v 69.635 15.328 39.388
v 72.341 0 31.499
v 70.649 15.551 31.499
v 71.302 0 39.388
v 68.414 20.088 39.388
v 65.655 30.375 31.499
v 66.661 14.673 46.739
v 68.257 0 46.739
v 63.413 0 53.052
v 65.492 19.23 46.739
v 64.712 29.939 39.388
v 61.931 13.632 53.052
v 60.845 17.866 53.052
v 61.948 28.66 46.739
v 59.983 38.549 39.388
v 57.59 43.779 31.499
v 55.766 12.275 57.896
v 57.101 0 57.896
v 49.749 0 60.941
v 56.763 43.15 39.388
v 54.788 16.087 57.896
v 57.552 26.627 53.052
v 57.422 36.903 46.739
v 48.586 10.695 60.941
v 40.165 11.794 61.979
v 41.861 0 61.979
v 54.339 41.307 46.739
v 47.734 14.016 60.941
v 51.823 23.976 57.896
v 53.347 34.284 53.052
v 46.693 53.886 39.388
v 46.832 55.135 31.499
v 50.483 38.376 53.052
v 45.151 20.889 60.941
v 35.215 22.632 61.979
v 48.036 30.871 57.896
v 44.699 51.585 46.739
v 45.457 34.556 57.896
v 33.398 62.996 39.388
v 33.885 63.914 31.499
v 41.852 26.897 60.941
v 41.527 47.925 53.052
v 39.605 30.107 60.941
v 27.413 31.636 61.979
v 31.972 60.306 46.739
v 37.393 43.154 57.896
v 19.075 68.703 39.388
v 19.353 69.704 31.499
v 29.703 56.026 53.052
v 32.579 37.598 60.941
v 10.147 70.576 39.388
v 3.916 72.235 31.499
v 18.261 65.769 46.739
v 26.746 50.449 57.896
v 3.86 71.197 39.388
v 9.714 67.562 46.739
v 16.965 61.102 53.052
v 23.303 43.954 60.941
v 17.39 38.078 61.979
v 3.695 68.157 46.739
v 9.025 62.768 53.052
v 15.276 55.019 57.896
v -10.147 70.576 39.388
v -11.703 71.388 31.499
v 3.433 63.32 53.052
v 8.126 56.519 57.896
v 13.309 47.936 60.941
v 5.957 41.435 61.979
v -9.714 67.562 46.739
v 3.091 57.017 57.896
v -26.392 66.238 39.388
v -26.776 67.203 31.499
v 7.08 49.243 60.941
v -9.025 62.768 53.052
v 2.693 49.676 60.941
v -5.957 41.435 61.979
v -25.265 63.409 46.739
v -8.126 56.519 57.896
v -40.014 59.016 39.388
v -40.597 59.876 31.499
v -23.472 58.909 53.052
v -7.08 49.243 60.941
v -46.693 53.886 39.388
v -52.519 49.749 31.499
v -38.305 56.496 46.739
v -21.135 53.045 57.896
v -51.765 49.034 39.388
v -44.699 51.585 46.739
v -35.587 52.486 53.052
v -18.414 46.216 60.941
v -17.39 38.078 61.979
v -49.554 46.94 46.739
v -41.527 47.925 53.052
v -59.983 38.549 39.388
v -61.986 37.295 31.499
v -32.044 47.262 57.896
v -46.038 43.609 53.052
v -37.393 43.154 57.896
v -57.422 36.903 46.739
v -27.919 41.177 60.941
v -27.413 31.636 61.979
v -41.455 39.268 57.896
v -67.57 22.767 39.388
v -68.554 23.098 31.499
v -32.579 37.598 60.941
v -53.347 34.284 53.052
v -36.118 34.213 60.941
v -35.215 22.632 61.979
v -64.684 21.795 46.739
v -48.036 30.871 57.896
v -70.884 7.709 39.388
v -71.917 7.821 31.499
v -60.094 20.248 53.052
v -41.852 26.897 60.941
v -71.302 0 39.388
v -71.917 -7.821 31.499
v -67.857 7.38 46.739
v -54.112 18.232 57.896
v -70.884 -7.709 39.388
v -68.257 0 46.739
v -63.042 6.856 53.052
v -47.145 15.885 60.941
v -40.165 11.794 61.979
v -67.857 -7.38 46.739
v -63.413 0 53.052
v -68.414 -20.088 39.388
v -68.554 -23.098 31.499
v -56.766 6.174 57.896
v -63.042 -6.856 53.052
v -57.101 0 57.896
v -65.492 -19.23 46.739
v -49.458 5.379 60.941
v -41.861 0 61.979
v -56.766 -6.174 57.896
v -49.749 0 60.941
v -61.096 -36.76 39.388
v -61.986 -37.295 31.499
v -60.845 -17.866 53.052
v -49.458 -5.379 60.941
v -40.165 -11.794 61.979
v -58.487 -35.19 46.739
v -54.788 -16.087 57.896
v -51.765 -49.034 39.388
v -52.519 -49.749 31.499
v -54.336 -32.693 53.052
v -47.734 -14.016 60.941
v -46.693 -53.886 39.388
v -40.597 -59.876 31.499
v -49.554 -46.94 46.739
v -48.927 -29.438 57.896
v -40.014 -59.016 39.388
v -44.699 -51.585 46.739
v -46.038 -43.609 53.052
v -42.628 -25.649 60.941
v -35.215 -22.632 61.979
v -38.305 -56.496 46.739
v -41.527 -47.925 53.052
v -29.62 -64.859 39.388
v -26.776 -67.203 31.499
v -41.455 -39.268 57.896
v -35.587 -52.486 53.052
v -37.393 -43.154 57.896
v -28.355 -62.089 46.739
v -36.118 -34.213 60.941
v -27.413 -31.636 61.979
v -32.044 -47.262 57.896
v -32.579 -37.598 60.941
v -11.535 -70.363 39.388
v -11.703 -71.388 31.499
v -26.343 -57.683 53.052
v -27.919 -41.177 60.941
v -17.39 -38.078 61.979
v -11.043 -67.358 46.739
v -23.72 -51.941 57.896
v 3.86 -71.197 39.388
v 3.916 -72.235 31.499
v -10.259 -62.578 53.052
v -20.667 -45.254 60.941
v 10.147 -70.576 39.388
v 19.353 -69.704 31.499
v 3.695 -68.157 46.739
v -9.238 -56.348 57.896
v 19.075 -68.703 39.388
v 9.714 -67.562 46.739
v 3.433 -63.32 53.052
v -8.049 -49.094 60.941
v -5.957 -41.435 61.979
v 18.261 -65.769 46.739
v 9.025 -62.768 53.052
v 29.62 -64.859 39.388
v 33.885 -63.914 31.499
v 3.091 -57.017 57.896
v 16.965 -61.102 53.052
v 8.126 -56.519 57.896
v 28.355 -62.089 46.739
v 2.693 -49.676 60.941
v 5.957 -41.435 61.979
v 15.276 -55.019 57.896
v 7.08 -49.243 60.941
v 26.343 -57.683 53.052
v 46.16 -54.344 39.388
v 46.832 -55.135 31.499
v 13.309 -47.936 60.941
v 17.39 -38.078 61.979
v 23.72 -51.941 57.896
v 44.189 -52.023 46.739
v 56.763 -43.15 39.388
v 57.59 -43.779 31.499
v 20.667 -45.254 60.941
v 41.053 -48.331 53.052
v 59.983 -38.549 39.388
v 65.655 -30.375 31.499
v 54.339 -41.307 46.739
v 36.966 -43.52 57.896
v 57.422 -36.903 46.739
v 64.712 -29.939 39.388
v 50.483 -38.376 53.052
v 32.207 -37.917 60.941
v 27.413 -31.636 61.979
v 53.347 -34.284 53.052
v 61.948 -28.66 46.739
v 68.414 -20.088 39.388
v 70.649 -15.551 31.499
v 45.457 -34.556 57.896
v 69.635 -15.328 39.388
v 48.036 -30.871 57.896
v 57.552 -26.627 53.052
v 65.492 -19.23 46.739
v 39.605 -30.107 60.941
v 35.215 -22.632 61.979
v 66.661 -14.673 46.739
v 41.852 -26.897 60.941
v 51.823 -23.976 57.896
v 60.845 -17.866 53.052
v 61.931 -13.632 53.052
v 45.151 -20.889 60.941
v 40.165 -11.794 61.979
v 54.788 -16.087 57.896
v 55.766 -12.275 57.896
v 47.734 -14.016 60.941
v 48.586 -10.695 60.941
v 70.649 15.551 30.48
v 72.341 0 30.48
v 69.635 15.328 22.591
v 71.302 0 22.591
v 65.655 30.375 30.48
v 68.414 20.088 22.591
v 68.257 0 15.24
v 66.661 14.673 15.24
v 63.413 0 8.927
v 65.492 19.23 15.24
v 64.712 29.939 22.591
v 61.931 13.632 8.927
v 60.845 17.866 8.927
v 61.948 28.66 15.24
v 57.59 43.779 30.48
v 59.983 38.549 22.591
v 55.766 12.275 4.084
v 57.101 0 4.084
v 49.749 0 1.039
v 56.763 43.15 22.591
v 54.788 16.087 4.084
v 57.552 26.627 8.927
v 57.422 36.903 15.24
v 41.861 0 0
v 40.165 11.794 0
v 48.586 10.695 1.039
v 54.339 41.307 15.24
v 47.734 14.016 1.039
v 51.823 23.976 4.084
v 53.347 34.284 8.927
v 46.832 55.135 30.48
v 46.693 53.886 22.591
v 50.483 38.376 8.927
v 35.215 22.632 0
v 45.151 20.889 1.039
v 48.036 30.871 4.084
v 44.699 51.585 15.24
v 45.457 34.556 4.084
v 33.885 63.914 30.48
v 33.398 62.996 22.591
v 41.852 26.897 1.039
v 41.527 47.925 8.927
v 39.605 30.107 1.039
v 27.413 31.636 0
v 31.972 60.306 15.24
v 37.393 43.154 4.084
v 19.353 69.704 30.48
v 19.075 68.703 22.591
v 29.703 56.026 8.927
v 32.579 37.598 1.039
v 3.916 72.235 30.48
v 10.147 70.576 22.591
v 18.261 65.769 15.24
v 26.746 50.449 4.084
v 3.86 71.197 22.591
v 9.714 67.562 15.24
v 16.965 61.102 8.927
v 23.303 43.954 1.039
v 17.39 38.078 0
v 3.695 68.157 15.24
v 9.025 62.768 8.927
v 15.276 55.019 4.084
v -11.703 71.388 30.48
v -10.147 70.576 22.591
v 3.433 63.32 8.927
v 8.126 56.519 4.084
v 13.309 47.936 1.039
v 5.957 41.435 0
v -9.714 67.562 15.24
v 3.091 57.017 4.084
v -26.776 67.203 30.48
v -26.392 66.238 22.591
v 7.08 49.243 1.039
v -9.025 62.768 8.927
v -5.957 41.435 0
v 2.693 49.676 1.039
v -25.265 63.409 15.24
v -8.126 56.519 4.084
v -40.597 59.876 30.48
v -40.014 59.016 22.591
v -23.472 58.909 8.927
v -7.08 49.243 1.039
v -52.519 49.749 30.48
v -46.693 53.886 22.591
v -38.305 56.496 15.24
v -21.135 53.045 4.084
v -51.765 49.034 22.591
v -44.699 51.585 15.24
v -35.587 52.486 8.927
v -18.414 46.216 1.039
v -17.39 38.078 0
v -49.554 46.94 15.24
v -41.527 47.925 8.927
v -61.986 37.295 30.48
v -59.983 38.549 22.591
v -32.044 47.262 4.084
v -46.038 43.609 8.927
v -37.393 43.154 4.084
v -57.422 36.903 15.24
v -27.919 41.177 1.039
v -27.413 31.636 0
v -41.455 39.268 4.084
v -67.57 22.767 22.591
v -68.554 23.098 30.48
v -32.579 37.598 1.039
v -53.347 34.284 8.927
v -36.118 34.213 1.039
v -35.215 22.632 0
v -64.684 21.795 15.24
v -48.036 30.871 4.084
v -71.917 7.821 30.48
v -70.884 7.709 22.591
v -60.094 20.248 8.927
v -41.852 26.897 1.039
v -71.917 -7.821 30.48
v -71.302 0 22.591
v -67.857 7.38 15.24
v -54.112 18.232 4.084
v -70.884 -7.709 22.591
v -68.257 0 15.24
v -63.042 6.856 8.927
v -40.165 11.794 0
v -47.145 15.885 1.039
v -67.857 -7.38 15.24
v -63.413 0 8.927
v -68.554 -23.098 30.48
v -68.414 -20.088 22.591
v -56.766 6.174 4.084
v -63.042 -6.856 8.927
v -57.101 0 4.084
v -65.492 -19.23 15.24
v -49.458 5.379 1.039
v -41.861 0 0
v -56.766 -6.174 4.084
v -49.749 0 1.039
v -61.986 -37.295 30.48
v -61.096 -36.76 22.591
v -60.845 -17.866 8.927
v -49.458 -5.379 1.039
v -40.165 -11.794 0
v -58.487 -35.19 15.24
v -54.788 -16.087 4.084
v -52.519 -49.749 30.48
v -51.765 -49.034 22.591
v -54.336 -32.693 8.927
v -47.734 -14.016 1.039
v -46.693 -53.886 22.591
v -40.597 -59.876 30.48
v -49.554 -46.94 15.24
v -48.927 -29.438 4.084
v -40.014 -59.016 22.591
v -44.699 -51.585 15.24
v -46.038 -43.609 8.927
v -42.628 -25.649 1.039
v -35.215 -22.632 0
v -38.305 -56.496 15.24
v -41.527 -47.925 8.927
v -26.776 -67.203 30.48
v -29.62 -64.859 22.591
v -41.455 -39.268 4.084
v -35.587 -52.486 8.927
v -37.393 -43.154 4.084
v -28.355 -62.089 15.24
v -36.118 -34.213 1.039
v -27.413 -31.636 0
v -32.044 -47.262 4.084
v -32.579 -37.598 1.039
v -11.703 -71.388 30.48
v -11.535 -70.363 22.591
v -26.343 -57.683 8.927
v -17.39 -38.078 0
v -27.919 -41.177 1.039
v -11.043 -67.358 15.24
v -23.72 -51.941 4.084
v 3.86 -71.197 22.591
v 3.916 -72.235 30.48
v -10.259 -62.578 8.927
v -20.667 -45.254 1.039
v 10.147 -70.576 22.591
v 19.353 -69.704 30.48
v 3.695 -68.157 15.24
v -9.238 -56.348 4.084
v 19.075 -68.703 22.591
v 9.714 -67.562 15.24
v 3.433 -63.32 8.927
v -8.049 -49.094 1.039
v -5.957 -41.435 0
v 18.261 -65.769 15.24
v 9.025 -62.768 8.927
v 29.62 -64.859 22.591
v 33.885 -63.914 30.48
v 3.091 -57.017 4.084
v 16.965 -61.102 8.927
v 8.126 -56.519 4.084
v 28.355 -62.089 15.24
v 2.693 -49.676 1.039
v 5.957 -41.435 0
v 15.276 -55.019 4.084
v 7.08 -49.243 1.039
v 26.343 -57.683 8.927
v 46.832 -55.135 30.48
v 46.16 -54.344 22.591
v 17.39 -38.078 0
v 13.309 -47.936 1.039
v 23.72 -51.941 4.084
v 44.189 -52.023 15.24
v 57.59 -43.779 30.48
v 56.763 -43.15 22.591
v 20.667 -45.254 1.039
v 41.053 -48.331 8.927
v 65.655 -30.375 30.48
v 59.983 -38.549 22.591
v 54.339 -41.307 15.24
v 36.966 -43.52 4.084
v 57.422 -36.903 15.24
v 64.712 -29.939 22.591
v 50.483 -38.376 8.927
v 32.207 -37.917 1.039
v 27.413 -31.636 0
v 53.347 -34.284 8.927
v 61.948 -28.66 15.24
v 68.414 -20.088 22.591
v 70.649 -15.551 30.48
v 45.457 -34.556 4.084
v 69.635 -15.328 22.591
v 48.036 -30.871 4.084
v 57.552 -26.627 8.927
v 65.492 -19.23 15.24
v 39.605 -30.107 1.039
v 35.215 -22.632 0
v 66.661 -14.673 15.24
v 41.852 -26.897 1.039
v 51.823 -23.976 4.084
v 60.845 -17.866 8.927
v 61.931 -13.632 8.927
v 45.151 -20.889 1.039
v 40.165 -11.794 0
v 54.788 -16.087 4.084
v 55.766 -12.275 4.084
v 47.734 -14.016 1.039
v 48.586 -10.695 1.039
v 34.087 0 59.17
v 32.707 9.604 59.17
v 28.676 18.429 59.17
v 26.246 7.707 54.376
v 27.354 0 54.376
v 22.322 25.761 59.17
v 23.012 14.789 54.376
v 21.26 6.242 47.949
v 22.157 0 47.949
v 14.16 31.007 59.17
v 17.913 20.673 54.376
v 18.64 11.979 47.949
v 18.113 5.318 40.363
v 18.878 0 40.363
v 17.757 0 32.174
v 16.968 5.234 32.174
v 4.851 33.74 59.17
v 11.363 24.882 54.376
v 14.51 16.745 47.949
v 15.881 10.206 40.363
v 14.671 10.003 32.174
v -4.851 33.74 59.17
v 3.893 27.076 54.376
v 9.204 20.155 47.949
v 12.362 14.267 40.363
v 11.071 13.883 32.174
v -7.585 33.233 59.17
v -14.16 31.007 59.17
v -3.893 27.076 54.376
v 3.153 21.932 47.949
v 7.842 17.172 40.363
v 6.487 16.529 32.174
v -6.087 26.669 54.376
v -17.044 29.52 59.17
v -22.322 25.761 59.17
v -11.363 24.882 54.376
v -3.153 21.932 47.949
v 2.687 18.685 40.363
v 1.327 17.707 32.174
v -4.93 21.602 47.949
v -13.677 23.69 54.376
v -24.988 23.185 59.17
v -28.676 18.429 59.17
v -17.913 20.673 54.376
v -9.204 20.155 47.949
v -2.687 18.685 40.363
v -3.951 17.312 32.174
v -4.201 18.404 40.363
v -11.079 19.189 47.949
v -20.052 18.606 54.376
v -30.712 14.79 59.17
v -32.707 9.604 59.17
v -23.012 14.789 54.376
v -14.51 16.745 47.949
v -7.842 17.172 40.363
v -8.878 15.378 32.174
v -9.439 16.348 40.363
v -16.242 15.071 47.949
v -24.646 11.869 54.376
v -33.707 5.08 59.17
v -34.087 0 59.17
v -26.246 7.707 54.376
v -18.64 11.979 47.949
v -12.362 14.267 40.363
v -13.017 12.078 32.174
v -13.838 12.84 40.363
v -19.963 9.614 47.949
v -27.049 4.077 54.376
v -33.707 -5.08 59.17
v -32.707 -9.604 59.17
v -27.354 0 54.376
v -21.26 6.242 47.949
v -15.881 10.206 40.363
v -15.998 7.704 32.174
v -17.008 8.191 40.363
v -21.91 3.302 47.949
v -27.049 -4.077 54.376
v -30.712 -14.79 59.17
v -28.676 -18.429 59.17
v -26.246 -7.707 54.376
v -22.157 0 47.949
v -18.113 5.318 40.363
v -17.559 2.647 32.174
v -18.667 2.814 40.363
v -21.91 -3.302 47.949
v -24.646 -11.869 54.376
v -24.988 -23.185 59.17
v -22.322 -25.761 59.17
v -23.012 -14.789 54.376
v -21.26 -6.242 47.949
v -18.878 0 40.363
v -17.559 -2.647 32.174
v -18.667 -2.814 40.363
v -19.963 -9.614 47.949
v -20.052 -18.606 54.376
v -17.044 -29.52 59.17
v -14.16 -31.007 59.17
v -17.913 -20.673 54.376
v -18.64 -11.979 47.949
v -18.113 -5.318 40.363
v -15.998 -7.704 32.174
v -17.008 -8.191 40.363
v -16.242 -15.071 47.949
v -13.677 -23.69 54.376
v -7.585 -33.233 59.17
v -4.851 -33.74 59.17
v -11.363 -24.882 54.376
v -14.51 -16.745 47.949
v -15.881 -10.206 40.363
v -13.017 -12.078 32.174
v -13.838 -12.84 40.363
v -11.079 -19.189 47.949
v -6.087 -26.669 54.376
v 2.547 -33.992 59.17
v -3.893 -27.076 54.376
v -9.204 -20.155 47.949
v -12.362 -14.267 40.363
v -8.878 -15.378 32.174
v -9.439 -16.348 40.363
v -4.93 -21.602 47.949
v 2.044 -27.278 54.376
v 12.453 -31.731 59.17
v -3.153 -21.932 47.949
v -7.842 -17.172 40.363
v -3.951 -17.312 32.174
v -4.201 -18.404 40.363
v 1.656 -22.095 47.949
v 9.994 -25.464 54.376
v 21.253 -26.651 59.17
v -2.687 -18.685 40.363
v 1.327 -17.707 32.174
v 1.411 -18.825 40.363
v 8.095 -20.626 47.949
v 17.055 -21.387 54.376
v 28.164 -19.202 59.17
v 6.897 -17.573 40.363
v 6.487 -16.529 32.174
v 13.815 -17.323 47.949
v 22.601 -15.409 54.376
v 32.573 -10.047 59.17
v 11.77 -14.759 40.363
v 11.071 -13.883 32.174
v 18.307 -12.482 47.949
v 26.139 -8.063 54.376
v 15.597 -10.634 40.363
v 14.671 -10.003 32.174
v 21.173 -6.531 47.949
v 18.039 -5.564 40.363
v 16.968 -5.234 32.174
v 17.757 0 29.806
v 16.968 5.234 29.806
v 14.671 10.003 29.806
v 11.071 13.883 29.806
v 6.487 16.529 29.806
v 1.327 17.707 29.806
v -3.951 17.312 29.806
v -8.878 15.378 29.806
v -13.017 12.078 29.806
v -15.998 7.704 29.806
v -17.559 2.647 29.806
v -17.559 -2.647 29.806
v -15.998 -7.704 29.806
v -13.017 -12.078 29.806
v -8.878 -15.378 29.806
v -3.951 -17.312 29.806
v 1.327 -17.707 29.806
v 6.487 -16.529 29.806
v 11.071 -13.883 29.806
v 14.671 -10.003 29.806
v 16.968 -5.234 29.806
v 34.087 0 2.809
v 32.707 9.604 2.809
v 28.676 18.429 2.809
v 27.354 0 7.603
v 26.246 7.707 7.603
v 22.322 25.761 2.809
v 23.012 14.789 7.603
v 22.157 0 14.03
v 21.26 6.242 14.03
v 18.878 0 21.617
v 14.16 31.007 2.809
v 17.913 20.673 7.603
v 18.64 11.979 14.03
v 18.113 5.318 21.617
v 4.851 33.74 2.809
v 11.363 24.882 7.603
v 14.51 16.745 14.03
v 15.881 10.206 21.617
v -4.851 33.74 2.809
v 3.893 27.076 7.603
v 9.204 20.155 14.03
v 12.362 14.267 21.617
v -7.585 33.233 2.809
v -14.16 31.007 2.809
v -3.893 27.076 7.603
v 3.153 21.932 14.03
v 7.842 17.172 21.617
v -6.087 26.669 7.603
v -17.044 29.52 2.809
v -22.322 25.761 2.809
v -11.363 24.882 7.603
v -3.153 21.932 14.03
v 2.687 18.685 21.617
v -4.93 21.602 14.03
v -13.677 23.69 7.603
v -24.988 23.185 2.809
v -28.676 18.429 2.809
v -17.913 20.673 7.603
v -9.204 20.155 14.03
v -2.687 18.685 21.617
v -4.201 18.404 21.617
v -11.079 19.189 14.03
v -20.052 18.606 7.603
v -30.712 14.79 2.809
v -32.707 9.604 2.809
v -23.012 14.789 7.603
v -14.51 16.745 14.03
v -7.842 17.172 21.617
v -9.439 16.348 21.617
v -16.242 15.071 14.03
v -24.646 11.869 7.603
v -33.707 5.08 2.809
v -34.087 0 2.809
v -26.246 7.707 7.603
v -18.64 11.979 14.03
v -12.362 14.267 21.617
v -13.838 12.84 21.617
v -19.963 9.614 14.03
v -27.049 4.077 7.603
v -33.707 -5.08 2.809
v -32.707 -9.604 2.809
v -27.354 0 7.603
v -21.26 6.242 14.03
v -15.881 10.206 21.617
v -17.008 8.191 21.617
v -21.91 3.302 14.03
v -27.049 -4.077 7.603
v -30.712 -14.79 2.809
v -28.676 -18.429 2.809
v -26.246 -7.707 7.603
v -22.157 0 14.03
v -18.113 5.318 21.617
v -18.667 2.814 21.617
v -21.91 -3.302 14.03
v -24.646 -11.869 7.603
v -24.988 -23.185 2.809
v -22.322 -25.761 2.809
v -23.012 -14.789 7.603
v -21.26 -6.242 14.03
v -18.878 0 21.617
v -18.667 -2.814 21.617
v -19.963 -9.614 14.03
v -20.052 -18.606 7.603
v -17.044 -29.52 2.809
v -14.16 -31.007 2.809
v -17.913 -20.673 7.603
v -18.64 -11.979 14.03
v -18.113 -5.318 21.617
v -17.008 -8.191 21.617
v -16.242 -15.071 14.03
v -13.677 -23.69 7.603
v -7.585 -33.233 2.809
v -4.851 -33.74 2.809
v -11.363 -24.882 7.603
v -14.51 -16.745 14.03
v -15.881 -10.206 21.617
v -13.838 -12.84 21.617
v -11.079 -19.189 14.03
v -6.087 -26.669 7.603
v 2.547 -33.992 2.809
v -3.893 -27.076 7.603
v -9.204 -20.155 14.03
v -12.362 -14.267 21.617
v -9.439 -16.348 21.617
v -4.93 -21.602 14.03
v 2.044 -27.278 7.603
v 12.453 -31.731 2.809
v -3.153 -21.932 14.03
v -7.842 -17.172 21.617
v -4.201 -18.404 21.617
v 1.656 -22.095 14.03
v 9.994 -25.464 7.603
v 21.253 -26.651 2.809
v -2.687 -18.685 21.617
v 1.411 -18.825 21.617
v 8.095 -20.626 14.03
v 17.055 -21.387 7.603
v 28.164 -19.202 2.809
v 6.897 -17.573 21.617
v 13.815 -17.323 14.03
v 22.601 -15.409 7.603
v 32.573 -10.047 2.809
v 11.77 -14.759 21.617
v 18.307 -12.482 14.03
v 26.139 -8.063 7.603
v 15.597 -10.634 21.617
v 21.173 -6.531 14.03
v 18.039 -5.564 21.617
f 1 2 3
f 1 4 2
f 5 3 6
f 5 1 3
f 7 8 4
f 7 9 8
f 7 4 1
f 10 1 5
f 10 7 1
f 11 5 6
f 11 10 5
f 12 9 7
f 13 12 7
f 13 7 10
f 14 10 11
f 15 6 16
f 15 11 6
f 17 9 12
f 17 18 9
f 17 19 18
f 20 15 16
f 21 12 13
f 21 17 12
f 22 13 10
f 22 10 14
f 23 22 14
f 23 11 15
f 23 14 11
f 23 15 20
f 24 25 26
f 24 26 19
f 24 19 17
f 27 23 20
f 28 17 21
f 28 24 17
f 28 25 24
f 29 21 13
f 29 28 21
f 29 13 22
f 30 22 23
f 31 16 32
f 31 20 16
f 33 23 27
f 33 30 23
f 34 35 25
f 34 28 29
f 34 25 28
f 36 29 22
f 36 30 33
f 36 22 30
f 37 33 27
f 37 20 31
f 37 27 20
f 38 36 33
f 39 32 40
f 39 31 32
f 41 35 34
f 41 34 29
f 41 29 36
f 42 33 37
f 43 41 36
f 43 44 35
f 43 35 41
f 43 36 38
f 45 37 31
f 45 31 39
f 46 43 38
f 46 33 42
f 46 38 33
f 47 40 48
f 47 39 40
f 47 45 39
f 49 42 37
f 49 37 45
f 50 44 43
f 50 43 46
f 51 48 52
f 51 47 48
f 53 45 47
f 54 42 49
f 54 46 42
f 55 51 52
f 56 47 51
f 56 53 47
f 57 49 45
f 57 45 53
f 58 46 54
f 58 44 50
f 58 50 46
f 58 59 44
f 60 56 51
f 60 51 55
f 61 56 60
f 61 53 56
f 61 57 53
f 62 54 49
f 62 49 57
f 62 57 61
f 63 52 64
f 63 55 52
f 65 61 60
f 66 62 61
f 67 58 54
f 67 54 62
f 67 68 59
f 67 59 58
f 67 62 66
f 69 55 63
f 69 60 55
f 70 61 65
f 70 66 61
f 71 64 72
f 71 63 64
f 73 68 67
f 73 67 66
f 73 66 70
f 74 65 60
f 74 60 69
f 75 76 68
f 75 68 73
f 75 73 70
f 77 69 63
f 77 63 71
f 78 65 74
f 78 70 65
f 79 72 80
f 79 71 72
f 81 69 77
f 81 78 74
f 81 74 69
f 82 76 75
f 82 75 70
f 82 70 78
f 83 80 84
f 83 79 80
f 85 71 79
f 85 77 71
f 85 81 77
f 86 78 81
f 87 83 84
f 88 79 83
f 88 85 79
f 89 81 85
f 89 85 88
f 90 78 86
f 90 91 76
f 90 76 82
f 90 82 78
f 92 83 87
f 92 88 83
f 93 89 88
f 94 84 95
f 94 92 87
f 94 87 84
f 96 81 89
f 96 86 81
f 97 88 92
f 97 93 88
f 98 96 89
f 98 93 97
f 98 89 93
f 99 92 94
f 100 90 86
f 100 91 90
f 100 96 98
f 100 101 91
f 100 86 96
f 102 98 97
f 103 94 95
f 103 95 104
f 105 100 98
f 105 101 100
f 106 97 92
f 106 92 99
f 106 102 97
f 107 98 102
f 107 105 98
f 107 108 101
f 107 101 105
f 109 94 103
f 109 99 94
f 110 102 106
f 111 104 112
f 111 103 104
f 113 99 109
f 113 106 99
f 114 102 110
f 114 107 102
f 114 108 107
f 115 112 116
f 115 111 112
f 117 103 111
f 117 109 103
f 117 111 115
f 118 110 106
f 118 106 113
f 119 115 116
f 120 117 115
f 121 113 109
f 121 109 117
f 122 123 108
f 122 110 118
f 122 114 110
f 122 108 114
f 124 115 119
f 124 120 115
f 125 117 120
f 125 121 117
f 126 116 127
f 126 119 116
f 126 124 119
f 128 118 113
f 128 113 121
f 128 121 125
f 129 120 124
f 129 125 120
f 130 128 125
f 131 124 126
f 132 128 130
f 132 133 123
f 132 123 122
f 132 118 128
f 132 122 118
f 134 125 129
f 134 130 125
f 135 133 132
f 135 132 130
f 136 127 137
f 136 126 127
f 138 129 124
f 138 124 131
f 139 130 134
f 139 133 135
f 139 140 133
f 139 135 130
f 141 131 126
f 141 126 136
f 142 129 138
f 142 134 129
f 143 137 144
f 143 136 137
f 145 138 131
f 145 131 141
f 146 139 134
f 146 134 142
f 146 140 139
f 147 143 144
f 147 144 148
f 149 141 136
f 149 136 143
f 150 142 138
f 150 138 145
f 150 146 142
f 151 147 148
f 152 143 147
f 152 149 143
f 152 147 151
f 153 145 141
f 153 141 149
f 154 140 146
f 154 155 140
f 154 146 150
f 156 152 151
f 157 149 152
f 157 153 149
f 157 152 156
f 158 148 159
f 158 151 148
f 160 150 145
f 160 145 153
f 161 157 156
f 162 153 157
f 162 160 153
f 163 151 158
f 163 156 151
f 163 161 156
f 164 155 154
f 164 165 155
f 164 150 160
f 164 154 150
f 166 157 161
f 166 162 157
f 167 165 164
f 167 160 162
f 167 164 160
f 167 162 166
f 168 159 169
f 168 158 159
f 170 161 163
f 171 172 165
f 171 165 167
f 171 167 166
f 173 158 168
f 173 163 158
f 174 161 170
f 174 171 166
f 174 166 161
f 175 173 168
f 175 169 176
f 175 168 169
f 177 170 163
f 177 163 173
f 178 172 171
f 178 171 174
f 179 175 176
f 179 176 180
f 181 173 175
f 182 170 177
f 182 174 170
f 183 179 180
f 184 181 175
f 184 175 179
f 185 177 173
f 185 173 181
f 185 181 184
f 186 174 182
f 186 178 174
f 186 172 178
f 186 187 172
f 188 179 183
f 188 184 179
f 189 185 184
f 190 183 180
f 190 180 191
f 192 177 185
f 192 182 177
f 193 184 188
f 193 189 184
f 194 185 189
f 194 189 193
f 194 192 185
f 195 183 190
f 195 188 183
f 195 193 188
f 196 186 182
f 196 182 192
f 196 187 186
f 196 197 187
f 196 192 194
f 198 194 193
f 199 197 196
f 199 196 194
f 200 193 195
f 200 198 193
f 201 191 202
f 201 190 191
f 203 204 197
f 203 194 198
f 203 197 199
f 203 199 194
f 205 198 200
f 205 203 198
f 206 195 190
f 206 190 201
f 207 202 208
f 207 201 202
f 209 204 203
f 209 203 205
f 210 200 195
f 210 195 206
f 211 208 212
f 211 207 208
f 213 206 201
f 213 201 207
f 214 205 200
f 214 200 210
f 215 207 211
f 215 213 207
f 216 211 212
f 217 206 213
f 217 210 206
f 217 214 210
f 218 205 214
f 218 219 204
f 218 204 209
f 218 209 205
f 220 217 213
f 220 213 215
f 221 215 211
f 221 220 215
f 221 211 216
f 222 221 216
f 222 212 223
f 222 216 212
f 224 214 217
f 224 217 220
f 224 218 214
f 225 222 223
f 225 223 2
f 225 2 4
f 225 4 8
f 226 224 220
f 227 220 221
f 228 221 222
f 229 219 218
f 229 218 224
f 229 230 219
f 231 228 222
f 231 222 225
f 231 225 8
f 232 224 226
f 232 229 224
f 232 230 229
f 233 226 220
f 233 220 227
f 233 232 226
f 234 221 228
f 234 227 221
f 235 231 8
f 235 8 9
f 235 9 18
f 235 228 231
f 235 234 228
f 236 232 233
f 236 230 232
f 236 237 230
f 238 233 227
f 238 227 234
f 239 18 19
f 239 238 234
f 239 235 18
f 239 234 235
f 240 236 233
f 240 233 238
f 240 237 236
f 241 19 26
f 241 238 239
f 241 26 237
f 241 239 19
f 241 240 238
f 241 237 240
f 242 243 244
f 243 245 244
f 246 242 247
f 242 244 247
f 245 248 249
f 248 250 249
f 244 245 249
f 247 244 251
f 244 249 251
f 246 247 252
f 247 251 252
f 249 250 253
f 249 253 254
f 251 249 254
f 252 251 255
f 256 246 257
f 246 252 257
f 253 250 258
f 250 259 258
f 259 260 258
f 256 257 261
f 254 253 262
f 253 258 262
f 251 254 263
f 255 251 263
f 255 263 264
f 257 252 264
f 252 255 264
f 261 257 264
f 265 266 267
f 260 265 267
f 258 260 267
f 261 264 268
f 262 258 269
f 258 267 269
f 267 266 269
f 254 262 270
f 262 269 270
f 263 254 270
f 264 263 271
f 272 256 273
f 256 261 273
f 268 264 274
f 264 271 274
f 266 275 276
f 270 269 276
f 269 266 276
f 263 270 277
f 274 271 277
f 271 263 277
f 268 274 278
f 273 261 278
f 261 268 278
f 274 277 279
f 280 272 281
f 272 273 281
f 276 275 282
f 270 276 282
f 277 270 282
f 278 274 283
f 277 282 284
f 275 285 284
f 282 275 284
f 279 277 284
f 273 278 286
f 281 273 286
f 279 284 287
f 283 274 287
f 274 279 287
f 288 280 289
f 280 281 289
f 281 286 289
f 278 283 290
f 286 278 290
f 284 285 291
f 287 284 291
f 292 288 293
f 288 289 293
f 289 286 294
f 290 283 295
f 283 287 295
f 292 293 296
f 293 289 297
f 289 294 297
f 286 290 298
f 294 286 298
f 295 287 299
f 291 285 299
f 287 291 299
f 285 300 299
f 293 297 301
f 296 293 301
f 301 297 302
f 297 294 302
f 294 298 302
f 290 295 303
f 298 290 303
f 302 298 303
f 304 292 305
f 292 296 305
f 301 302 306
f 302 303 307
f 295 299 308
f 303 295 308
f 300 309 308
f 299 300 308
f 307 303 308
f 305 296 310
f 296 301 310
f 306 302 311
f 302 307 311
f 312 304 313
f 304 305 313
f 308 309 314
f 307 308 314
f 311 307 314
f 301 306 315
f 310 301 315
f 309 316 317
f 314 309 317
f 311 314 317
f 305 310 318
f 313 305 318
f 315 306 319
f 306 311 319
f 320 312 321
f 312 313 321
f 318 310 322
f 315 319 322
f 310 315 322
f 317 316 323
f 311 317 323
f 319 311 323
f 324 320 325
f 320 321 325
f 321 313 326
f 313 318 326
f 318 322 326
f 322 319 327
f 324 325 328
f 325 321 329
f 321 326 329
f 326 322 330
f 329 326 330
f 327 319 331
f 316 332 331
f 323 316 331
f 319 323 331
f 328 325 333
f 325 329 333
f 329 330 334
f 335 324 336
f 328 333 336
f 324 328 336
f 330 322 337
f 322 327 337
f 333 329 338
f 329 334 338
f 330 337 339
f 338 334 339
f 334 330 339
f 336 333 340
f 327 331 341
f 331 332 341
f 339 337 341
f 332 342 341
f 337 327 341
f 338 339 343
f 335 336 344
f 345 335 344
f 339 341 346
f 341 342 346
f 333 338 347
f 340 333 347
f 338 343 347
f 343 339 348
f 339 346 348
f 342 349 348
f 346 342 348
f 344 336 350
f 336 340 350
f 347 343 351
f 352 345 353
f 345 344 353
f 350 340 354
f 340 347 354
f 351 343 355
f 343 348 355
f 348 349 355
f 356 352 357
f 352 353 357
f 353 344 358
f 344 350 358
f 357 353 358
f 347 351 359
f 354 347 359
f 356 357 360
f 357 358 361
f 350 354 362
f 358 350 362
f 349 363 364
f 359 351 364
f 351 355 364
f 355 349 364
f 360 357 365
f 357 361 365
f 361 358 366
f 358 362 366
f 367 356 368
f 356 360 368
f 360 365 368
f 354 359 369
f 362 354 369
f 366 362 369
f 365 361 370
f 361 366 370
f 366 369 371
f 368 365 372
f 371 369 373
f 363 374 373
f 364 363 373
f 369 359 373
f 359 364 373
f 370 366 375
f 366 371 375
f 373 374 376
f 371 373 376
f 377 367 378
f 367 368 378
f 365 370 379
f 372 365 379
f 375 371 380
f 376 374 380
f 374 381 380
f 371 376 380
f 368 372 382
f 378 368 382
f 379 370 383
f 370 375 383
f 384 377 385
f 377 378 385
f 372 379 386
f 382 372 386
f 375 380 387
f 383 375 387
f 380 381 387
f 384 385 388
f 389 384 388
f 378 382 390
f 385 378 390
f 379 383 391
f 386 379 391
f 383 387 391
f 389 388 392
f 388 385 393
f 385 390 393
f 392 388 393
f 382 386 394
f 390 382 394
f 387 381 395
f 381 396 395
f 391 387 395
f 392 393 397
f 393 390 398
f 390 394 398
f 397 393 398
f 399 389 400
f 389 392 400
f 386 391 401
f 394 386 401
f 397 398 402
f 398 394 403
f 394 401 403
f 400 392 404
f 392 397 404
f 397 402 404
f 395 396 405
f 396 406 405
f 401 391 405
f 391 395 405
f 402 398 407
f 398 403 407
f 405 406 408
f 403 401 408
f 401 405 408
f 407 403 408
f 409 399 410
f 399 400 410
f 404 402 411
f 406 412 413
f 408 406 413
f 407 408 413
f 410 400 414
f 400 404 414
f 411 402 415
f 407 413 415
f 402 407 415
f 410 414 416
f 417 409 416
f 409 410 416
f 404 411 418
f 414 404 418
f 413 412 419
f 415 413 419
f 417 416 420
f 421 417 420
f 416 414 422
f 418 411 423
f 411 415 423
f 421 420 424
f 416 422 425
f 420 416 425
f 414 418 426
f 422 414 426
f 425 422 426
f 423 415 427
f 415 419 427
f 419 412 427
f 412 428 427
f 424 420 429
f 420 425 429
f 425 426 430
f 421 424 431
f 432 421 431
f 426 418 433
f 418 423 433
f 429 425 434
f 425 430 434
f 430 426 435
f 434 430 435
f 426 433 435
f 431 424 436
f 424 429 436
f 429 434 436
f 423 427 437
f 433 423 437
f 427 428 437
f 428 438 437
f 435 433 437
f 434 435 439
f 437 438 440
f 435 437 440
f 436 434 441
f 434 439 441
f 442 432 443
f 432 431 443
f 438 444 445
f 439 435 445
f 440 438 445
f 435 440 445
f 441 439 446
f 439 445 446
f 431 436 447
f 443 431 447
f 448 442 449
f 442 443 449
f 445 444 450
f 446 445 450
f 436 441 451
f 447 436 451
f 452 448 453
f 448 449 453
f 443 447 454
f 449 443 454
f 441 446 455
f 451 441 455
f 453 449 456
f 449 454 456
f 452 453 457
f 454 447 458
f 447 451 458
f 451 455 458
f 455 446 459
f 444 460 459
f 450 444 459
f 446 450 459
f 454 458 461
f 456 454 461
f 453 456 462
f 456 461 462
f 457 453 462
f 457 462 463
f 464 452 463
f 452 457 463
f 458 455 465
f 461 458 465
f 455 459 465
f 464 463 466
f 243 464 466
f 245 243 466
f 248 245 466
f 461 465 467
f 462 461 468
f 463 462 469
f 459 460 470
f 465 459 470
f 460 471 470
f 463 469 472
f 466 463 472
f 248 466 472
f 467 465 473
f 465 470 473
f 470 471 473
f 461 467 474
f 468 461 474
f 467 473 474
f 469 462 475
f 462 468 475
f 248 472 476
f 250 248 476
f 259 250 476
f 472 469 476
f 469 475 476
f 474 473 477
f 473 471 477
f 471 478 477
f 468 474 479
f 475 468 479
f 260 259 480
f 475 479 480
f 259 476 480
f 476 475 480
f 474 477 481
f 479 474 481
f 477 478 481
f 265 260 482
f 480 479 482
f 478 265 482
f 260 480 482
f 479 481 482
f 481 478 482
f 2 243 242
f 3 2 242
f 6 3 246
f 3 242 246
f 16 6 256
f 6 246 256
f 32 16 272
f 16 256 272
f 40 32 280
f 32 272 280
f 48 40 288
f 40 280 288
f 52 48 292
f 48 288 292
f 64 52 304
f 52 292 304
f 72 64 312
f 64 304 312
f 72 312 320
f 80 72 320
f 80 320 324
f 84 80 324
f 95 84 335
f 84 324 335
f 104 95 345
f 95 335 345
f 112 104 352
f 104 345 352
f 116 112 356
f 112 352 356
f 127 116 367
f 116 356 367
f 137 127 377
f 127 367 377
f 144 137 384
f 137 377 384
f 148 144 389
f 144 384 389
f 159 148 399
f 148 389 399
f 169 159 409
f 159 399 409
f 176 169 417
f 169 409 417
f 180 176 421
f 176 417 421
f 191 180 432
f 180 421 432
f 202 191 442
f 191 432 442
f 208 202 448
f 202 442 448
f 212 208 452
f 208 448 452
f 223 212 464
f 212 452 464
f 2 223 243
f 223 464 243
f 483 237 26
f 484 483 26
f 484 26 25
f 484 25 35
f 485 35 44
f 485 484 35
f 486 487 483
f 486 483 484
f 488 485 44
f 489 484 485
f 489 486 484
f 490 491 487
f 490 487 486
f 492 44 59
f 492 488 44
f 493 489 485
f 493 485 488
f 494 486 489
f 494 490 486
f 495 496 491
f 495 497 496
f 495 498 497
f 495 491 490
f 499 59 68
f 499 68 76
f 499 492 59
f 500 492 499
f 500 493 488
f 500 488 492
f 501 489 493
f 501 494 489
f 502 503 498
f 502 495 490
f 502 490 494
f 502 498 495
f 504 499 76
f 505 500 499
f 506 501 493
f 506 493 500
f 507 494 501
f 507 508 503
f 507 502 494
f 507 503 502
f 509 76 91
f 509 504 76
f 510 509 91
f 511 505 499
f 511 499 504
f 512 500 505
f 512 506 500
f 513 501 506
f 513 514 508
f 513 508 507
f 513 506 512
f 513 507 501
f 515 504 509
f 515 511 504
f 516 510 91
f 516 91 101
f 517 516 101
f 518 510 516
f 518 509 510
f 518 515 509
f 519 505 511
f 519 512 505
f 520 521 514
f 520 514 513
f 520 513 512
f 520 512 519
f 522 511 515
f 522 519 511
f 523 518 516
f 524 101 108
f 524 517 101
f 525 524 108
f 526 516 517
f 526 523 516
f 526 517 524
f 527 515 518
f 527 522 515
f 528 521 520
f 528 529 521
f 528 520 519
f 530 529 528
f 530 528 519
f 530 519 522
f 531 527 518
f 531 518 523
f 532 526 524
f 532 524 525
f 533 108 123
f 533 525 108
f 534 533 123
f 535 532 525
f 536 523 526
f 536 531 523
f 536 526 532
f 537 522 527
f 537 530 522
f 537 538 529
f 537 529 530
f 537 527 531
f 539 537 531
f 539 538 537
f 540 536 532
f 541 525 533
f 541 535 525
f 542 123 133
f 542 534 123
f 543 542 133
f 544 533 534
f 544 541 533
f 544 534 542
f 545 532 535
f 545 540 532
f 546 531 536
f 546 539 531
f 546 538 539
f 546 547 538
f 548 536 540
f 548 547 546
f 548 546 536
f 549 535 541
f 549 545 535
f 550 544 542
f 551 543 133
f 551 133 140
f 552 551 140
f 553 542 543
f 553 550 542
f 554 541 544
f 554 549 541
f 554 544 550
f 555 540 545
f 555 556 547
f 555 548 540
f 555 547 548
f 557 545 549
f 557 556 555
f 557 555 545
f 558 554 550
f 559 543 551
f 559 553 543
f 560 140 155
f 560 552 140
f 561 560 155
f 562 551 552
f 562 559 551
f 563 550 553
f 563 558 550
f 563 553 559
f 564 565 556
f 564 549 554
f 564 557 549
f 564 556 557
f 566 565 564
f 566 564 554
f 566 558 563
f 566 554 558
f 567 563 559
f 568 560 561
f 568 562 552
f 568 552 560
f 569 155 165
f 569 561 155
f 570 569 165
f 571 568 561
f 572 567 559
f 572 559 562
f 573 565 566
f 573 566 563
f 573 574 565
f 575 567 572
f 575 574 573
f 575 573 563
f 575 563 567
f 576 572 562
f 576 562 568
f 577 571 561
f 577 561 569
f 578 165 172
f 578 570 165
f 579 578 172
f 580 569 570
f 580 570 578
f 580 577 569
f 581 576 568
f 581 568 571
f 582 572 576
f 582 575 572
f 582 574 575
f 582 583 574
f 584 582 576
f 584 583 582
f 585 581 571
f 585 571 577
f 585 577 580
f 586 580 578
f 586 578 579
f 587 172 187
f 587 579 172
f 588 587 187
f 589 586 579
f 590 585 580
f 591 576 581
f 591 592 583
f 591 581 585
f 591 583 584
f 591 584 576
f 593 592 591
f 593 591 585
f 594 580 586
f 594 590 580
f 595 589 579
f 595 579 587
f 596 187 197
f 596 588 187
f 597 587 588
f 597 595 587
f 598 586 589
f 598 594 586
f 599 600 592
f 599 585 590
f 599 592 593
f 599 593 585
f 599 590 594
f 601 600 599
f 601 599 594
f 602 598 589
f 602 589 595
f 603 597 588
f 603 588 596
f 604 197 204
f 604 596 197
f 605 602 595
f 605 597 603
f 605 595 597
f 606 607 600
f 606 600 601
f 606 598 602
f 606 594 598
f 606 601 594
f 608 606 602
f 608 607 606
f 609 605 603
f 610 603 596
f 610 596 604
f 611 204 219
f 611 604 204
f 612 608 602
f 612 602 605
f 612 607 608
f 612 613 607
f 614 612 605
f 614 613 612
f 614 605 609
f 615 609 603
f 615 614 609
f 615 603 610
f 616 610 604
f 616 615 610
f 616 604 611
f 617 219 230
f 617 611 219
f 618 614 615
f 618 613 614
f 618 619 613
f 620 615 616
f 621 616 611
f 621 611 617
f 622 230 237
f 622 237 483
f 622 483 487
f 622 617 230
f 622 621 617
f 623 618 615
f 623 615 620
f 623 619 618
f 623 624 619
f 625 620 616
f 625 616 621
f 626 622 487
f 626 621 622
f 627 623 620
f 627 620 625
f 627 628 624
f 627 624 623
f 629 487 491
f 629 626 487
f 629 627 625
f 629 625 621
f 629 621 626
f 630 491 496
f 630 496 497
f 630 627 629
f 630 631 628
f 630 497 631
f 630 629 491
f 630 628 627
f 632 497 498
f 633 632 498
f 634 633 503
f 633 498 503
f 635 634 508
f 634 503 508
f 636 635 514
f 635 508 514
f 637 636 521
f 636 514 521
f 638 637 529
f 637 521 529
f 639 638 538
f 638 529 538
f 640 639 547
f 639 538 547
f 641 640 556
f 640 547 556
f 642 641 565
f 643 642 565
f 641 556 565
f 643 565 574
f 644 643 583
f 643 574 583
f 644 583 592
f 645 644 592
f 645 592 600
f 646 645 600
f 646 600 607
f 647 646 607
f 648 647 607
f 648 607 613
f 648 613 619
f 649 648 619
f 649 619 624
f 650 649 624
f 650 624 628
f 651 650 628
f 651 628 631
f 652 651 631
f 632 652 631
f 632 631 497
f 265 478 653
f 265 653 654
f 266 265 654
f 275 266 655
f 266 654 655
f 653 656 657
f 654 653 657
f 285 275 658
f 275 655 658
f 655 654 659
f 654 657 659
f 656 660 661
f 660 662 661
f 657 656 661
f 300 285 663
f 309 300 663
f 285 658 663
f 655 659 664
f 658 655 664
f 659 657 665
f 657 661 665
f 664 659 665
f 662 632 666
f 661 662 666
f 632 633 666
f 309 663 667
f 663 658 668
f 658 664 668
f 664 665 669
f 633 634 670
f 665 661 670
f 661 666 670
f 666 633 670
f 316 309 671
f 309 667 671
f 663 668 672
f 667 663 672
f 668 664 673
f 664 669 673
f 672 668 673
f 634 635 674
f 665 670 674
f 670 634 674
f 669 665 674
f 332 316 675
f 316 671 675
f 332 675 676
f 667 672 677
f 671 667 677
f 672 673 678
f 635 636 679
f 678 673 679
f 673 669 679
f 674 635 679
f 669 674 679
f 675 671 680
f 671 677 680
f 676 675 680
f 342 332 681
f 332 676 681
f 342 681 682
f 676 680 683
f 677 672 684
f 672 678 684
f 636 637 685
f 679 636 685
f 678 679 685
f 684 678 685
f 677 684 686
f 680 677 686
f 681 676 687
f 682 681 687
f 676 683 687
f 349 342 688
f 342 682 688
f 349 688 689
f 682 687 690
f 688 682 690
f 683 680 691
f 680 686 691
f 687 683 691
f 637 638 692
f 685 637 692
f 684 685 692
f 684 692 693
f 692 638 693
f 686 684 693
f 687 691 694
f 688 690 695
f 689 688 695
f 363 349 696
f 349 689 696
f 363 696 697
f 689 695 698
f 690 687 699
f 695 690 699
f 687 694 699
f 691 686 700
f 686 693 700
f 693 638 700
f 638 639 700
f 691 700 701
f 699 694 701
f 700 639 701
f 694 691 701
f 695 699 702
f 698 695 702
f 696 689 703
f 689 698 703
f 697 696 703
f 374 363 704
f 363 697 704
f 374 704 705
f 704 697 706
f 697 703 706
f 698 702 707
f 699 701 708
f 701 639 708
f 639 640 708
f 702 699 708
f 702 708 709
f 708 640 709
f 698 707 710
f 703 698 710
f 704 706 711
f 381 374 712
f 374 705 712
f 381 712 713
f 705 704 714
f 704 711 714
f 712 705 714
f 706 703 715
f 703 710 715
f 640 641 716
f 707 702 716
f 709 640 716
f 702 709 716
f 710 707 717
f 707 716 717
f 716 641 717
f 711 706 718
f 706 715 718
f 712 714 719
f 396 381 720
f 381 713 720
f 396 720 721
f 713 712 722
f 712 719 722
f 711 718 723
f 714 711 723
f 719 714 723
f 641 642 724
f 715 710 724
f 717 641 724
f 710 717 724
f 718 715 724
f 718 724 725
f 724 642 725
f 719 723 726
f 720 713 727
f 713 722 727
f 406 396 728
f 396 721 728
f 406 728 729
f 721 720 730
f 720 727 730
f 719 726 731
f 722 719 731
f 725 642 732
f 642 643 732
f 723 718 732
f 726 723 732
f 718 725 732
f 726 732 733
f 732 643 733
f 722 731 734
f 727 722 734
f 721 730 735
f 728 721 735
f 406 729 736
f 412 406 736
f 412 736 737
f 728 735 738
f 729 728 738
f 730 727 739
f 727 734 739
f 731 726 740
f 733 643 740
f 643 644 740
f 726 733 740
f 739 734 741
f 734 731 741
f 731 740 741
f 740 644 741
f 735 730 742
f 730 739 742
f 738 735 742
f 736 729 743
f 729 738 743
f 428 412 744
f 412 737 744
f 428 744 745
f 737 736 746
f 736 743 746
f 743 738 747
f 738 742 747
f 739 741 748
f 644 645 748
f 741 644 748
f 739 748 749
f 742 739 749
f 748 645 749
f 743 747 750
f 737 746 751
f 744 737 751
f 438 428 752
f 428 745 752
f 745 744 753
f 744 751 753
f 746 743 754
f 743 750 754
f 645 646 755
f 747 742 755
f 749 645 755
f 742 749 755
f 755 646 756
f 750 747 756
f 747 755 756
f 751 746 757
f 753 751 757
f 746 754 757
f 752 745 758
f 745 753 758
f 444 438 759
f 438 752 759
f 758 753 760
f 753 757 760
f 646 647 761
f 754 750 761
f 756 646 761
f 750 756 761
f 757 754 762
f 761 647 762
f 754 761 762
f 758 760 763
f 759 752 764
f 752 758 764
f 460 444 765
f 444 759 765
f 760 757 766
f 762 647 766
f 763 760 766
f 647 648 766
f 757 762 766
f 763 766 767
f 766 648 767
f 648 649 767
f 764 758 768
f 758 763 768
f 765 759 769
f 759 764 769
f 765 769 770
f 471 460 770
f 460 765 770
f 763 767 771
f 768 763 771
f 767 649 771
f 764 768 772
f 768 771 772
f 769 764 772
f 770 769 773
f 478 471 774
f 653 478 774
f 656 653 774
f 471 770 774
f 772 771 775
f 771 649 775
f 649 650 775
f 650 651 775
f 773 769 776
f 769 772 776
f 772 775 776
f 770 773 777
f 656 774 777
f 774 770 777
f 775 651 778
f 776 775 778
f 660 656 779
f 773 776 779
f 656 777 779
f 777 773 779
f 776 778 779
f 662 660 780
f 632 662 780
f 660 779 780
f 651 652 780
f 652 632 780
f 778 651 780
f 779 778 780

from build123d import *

# Parameters (mm, degrees)
F0_R     = 72.3406344385
F1_DEPTH = 61.9792044163
F2_R     = 17.7569535603
F3_DEPTH = 66.9353306293
F4_R     = 30.48


# Not quite as in the source:
# - a fillet or chamfer that OpenCascade refuses, or shapes differently, is made with other operations: its cross-section is extruded or revolved along the edge and cut away or added


with BuildPart() as f1:
    # F0 (on Top) → F1 (new body)
    with BuildSketch(Plane.XY):
        Circle(F0_R)
    extrude(amount=F1_DEPTH)

    # F2 (on face) → F3 (cut)
    with BuildSketch(Plane.XY.offset(61.9792044163)):
        Circle(F2_R)
    extrude(amount=-F3_DEPTH, mode=Mode.SUBTRACT)

    # F4
    f4_edges = [f1.edges().sort_by_distance(p)[0] for p in [
        (-72.340634, 0, 61.979204),
        (72.340634, 0, 30.989602),
        (-72.340634, 0, 0),
    ]]
    fillet(f4_edges, radius=F4_R)

    # F5: fillet of radius 30.48 on 3 edges, made by hand

    # F5_s1 → F5_t2 (revolve, cut)
    with BuildSketch(Plane.XZ):
        with BuildLine():
            ThreePointArc((41.8606344385, 61.9792044163), (24.5369471591, 51.3397369094), (17.7569535603, 32.1736184556))
            Line((17.7569535603, 32.1736184556), (17.7569535603, 61.9792044163))
            Line((17.7569535603, 61.9792044163), (41.8606344385, 61.9792044163))
        make_face()
    revolve(axis=Axis((0, 0, 61.9792044163), (0, 0, 1)), mode=Mode.SUBTRACT)

    # F5_s3 → F5_t4 (revolve, cut)
    with BuildSketch(Plane.XZ):
        with BuildLine():
            ThreePointArc((41.8606344385, 0), (24.5369471591, 10.6394675069), (17.7569535603, 29.8055859606))
            Line((17.7569535603, 29.8055859606), (17.7569535603, 0))
            Line((17.7569535603, 0), (41.8606344385, 0))
        make_face()
    revolve(axis=Axis((0, 0, 0), (0, 0, 1)), mode=Mode.SUBTRACT)


solid = f1.part
